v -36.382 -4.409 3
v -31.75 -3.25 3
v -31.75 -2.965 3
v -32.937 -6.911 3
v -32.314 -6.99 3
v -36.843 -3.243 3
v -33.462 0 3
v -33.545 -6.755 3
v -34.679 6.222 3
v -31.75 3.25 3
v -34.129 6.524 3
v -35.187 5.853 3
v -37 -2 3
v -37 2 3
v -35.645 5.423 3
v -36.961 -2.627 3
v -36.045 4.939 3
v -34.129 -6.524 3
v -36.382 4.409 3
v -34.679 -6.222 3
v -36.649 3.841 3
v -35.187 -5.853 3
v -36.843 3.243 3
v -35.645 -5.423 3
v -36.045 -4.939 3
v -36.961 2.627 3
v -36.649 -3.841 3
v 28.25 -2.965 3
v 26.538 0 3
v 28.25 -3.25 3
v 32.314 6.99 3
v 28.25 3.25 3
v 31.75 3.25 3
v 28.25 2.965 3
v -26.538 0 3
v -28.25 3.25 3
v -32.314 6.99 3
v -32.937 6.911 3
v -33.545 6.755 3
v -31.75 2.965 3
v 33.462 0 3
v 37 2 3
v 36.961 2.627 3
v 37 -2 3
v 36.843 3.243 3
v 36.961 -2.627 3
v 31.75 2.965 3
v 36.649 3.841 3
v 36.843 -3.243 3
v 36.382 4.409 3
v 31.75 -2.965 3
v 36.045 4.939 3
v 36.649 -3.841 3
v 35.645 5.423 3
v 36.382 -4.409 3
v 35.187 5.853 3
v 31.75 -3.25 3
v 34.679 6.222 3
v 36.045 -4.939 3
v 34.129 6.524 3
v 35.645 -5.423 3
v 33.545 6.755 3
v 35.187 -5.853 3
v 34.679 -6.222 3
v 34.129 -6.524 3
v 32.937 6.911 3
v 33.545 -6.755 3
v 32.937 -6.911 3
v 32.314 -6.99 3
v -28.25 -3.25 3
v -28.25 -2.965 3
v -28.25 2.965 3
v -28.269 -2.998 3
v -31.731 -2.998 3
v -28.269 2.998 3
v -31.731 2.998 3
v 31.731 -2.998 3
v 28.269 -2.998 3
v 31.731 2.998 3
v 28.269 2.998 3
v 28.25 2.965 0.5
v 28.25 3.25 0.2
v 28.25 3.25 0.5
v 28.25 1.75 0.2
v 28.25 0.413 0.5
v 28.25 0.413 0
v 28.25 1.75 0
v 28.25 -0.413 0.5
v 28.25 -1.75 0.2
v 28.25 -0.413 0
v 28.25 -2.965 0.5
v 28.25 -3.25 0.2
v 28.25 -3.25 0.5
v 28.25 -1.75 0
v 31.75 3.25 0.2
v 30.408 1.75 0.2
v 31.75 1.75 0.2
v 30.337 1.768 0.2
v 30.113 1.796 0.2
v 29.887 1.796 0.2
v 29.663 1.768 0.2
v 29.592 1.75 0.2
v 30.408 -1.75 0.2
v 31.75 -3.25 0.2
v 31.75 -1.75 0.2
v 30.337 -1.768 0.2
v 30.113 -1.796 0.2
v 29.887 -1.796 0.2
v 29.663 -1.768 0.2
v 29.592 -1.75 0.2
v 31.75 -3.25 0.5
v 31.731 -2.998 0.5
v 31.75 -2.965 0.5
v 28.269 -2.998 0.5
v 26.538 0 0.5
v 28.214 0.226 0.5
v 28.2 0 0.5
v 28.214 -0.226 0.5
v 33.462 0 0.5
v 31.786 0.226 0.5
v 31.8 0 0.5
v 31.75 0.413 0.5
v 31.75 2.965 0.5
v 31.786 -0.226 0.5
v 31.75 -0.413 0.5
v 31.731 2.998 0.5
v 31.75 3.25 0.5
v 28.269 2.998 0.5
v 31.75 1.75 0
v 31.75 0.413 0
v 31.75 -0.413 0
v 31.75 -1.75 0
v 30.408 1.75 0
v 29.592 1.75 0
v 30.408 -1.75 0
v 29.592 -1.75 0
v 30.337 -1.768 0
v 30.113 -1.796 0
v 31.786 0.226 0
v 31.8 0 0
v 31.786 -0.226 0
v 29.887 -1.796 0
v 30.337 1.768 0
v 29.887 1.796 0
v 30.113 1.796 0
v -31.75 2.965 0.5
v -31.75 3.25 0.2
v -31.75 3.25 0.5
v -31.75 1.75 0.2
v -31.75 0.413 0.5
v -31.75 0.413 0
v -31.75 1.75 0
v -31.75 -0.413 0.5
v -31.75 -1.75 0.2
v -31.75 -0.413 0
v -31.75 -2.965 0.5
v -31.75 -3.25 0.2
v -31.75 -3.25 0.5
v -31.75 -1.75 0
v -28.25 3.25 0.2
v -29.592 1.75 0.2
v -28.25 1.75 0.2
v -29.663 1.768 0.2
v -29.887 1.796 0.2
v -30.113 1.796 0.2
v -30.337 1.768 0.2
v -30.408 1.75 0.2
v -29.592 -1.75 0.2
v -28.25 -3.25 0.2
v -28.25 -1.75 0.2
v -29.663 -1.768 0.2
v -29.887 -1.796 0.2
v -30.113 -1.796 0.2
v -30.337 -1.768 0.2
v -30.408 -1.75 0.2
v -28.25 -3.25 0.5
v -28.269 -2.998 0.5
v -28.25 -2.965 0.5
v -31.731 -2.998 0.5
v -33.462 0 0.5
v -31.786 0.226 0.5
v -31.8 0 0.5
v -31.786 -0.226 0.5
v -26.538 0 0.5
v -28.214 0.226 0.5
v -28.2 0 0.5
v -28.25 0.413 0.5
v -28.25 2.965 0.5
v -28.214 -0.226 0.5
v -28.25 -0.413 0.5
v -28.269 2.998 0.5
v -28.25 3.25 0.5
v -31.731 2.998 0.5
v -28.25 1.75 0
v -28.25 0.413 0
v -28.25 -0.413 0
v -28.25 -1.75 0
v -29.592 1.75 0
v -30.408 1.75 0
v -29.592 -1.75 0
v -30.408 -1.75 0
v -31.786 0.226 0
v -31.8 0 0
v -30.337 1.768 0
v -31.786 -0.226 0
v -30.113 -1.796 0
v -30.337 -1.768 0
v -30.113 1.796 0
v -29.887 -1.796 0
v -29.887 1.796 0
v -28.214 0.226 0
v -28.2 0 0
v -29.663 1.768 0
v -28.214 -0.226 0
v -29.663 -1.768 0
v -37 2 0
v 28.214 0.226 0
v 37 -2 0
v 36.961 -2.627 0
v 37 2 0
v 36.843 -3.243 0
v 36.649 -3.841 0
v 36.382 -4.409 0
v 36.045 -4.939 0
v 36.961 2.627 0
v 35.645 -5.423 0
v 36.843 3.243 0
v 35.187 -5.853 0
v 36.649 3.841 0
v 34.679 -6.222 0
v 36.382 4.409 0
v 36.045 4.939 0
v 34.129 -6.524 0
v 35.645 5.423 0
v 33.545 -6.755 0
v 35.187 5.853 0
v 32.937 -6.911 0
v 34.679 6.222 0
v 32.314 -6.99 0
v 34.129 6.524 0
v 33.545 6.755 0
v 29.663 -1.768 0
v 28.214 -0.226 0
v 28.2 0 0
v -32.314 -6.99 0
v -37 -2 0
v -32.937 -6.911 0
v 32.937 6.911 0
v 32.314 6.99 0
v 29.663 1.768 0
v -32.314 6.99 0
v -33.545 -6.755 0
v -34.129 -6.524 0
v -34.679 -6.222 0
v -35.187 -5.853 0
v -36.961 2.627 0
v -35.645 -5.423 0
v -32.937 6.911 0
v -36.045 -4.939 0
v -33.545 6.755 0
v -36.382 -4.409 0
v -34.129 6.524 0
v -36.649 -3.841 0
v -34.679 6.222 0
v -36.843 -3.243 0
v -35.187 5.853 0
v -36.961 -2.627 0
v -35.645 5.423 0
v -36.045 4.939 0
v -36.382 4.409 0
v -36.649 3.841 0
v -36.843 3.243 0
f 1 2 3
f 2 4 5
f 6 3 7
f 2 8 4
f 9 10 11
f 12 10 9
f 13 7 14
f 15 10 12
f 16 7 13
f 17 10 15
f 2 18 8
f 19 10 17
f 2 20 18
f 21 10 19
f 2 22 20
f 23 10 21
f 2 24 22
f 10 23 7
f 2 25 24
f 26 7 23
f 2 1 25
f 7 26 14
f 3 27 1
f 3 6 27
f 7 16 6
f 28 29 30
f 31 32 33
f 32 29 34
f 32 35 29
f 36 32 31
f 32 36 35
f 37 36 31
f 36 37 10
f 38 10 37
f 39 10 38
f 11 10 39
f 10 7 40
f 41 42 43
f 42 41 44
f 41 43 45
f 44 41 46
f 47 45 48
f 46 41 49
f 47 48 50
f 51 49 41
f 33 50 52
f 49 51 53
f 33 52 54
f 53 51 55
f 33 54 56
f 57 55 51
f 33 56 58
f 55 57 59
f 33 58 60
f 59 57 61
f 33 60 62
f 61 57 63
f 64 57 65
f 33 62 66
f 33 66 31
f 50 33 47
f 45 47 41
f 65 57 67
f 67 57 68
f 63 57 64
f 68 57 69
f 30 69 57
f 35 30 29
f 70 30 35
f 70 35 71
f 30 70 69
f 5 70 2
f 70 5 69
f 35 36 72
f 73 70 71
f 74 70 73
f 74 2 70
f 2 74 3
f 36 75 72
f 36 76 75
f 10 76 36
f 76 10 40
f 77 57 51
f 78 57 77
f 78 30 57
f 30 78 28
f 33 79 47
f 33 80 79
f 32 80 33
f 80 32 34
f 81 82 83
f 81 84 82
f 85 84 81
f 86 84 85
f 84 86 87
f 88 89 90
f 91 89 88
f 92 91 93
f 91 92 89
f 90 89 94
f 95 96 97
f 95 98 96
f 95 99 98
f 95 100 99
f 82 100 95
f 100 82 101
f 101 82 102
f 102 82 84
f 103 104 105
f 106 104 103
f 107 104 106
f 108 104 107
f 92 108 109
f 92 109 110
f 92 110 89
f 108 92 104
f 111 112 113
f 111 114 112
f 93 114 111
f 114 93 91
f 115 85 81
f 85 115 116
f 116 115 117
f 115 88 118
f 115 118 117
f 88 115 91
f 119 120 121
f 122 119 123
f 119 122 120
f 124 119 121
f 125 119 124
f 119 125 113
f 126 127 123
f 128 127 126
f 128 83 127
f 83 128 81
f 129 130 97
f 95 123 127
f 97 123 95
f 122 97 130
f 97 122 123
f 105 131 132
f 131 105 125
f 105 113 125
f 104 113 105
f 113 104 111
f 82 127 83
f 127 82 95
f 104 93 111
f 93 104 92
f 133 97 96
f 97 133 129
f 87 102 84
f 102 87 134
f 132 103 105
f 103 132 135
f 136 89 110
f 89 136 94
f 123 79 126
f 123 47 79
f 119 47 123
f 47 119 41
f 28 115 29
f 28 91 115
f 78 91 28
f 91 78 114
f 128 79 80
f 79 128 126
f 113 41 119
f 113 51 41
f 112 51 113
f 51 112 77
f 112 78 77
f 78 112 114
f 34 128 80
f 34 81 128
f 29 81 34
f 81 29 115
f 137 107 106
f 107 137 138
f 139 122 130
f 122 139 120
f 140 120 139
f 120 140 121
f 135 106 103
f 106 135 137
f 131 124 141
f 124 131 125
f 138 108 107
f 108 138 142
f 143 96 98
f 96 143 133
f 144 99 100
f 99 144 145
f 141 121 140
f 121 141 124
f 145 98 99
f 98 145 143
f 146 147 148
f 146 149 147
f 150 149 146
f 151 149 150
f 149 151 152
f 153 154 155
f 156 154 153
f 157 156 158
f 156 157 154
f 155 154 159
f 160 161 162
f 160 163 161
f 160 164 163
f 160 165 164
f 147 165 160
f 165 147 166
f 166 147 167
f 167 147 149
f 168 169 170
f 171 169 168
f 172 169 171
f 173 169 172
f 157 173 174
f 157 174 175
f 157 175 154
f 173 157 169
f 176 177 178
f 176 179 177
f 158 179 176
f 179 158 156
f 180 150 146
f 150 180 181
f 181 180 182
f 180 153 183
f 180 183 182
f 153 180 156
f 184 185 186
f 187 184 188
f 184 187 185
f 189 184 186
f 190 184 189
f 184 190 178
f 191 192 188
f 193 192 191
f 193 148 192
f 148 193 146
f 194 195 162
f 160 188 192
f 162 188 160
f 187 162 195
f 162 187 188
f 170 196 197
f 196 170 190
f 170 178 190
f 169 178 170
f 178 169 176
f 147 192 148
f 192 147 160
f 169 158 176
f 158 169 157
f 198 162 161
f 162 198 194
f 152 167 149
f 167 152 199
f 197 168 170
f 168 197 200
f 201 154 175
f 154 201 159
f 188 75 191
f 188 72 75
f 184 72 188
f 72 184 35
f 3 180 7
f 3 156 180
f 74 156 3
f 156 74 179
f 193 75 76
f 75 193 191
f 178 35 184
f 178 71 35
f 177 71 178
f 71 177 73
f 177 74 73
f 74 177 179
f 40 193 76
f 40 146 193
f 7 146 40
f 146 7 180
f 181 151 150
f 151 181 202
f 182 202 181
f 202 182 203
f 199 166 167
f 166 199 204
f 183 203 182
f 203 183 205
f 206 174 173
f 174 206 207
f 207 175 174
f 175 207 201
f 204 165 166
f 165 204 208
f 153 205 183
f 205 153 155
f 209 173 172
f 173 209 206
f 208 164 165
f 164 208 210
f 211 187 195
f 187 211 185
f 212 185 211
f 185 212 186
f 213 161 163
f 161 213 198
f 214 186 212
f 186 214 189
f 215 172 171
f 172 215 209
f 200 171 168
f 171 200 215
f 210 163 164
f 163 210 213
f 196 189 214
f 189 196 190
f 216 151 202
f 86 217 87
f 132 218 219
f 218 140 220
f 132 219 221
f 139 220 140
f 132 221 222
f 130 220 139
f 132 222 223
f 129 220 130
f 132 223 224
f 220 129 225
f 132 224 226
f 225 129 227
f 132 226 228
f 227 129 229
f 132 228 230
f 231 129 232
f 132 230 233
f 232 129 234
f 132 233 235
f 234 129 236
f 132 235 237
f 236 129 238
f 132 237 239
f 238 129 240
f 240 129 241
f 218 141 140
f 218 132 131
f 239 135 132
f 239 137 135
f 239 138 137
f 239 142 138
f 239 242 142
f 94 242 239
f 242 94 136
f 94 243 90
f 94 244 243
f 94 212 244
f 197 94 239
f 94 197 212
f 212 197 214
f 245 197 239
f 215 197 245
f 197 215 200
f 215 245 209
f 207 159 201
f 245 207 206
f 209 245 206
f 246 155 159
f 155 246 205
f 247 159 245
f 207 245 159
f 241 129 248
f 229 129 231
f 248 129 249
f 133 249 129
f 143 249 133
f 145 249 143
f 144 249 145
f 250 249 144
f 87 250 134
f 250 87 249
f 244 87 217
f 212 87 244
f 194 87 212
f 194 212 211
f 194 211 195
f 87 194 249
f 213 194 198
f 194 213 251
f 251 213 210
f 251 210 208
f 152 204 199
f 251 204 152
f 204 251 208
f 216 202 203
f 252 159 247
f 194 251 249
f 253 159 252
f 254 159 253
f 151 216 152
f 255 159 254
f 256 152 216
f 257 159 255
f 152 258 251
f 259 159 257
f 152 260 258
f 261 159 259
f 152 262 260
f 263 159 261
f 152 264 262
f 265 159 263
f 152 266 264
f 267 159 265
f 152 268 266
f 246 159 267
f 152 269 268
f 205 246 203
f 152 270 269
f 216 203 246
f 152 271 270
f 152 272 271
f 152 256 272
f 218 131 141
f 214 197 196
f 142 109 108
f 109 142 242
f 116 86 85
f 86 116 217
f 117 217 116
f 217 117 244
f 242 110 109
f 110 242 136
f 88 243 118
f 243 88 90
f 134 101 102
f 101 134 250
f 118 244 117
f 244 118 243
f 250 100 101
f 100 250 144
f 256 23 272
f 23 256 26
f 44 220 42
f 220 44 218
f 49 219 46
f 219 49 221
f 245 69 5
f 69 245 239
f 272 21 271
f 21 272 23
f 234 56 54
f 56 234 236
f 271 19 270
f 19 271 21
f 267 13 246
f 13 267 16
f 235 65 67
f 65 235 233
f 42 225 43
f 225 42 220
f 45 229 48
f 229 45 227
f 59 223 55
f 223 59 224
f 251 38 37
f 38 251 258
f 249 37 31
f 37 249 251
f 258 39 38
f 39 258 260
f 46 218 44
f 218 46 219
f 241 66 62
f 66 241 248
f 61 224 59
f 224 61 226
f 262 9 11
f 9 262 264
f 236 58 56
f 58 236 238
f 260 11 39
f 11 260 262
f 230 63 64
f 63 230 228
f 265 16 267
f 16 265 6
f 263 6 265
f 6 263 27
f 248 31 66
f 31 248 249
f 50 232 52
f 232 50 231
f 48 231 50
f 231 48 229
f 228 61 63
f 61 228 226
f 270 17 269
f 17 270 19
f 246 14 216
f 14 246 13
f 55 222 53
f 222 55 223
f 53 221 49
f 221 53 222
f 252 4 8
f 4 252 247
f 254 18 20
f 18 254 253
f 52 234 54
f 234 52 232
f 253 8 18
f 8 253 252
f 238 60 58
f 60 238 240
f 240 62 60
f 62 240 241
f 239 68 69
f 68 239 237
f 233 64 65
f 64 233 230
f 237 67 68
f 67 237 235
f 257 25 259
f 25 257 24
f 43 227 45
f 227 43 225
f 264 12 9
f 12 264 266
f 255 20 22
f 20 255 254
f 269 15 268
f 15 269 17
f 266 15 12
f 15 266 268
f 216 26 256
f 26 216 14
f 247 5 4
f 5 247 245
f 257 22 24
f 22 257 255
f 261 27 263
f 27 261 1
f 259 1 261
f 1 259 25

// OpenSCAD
$fn = 50;


difference() {
	union() {
		hull() {
			translate(v = [-32.0000000000, 2.0000000000, 0]) {
				cylinder(h = 3, r = 5);
			}
			translate(v = [32.0000000000, 2.0000000000, 0]) {
				cylinder(h = 3, r = 5);
			}
			translate(v = [-32.0000000000, -2.0000000000, 0]) {
				cylinder(h = 3, r = 5);
			}
			translate(v = [32.0000000000, -2.0000000000, 0]) {
				cylinder(h = 3, r = 5);
			}
		}
	}
	union() {
		translate(v = [30.0000000000, 0, -20]) {
			rotate(a = [0, 180, 0]) {
				difference() {
					union() {
						translate(v = [0, 0, -23.0000000000]) {
							rotate(a = [0, 0, 0]) {
								difference() {
									union() {
										#translate(v = [-1.7500000000, -3.2500000000, -0.3000000000]) {
											cube(size = [3.5000000000, 6.5000000000, 0.3000000000]);
										}
										#translate(v = [-1.7500000000, -1.7500000000, -0.6000000000]) {
											cube(size = [3.5000000000, 3.5000000000, 0.3000000000]);
										}
										#translate(v = [-1.7500000000, -3.2500000000, 2.5000000000]) {
											cube(size = [3.5000000000, 6.5000000000, 0.3000000000]);
										}
										#translate(v = [-1.7500000000, -1.7500000000, 2.8000000000]) {
											cube(size = [3.5000000000, 3.5000000000, 0.3000000000]);
										}
										#linear_extrude(height = 2.5000000000) {
											polygon(points = [[3.4620000000, 0.0000000000], [1.7310000000, 2.9981799479], [-1.7310000000, 2.9981799479], [-3.4620000000, 0.0000000000], [-1.7310000000, -2.9981799479], [1.7310000000, -2.9981799479]]);
										}
										#translate(v = [-1.7500000000, -3.2500000000, -0.3000000000]) {
											cube(size = [3.5000000000, 6.5000000000, 0.3000000000]);
										}
										#translate(v = [-1.7500000000, -1.7500000000, -0.6000000000]) {
											cube(size = [3.5000000000, 3.5000000000, 0.3000000000]);
										}
										#translate(v = [-1.7500000000, -3.2500000000, 2.5000000000]) {
											cube(size = [3.5000000000, 6.5000000000, 0.3000000000]);
										}
										#translate(v = [-1.7500000000, -1.7500000000, 2.8000000000]) {
											cube(size = [3.5000000000, 3.5000000000, 0.3000000000]);
										}
										#translate(v = [-1.7500000000, -3.2500000000, -0.3000000000]) {
											cube(size = [3.5000000000, 6.5000000000, 0.3000000000]);
										}
										#translate(v = [-1.7500000000, -1.7500000000, -0.6000000000]) {
											cube(size = [3.5000000000, 3.5000000000, 0.3000000000]);
										}
										#translate(v = [-1.7500000000, -3.2500000000, 2.5000000000]) {
											cube(size = [3.5000000000, 6.5000000000, 0.3000000000]);
										}
										#translate(v = [-1.7500000000, -1.7500000000, 2.8000000000]) {
											cube(size = [3.5000000000, 3.5000000000, 0.3000000000]);
										}
									}
									union();
								}
							}
						}
						translate(v = [0, 0, -23.0000000000]) {
							rotate(a = [0, 0, 0]) {
								difference() {
									union() {
										#translate(v = [-1.7500000000, -3.2500000000, -0.3000000000]) {
											cube(size = [3.5000000000, 6.5000000000, 0.3000000000]);
										}
										#translate(v = [-1.7500000000, -1.7500000000, -0.6000000000]) {
											cube(size = [3.5000000000, 3.5000000000, 0.3000000000]);
										}
										#translate(v = [-1.7500000000, -3.2500000000, 2.5000000000]) {
											cube(size = [3.5000000000, 6.5000000000, 0.3000000000]);
										}
										#translate(v = [-1.7500000000, -1.7500000000, 2.8000000000]) {
											cube(size = [3.5000000000, 3.5000000000, 0.3000000000]);
										}
										#linear_extrude(height = 2.5000000000) {
											polygon(points = [[3.4620000000, 0.0000000000], [1.7310000000, 2.9981799479], [-1.7310000000, 2.9981799479], [-3.4620000000, 0.0000000000], [-1.7310000000, -2.9981799479], [1.7310000000, -2.9981799479]]);
										}
										#translate(v = [-1.7500000000, -3.2500000000, -0.3000000000]) {
											cube(size = [3.5000000000, 6.5000000000, 0.3000000000]);
										}
										#translate(v = [-1.7500000000, -1.7500000000, -0.6000000000]) {
											cube(size = [3.5000000000, 3.5000000000, 0.3000000000]);
										}
										#translate(v = [-1.7500000000, -3.2500000000, 2.5000000000]) {
											cube(size = [3.5000000000, 6.5000000000, 0.3000000000]);
										}
										#translate(v = [-1.7500000000, -1.7500000000, 2.8000000000]) {
											cube(size = [3.5000000000, 3.5000000000, 0.3000000000]);
										}
										#translate(v = [-1.7500000000, -3.2500000000, -0.3000000000]) {
											cube(size = [3.5000000000, 6.5000000000, 0.3000000000]);
										}
										#translate(v = [-1.7500000000, -1.7500000000, -0.6000000000]) {
											cube(size = [3.5000000000, 3.5000000000, 0.3000000000]);
										}
										#translate(v = [-1.7500000000, -3.2500000000, 2.5000000000]) {
											cube(size = [3.5000000000, 6.5000000000, 0.3000000000]);
										}
										#translate(v = [-1.7500000000, -1.7500000000, 2.8000000000]) {
											cube(size = [3.5000000000, 3.5000000000, 0.3000000000]);
										}
									}
									union();
								}
							}
						}
						translate(v = [0, 0, -23.0000000000]) {
							rotate(a = [0, 0, 0]) {
								difference() {
									union() {
										#translate(v = [-1.7500000000, -3.2500000000, -0.3000000000]) {
											cube(size = [3.5000000000, 6.5000000000, 0.3000000000]);
										}
										#translate(v = [-1.7500000000, -1.7500000000, -0.6000000000]) {
											cube(size = [3.5000000000, 3.5000000000, 0.3000000000]);
										}
										#translate(v = [-1.7500000000, -3.2500000000, 2.5000000000]) {
											cube(size = [3.5000000000, 6.5000000000, 0.3000000000]);
										}
										#translate(v = [-1.7500000000, -1.7500000000, 2.8000000000]) {
											cube(size = [3.5000000000, 3.5000000000, 0.3000000000]);
										}
										#linear_extrude(height = 2.5000000000) {
											polygon(points = [[3.4620000000, 0.0000000000], [1.7310000000, 2.9981799479], [-1.7310000000, 2.9981799479], [-3.4620000000, 0.0000000000], [-1.7310000000, -2.9981799479], [1.7310000000, -2.9981799479]]);
										}
										#translate(v = [-1.7500000000, -3.2500000000, -0.3000000000]) {
											cube(size = [3.5000000000, 6.5000000000, 0.3000000000]);
										}
										#translate(v = [-1.7500000000, -1.7500000000, -0.6000000000]) {
											cube(size = [3.5000000000, 3.5000000000, 0.3000000000]);
										}
										#translate(v = [-1.7500000000, -3.2500000000, 2.5000000000]) {
											cube(size = [3.5000000000, 6.5000000000, 0.3000000000]);
										}
										#translate(v = [-1.7500000000, -1.7500000000, 2.8000000000]) {
											cube(size = [3.5000000000, 3.5000000000, 0.3000000000]);
										}
										#translate(v = [-1.7500000000, -3.2500000000, -0.3000000000]) {
											cube(size = [3.5000000000, 6.5000000000, 0.3000000000]);
										}
										#translate(v = [-1.7500000000, -1.7500000000, -0.6000000000]) {
											cube(size = [3.5000000000, 3.5000000000, 0.3000000000]);
										}
										#translate(v = [-1.7500000000, -3.2500000000, 2.5000000000]) {
											cube(size = [3.5000000000, 6.5000000000, 0.3000000000]);
										}
										#translate(v = [-1.7500000000, -1.7500000000, 2.8000000000]) {
											cube(size = [3.5000000000, 3.5000000000, 0.3000000000]);
										}
									}
									union();
								}
							}
						}
						#translate(v = [0, 0, -23.0000000000]) {
							cylinder(h = 23, r = 1.5000000000);
						}
						#translate(v = [0, 0, -1.9000000000]) {
							cylinder(h = 1.9000000000, r1 = 1.8000000000, r2 = 3.6000000000);
						}
						#translate(v = [0, 0, -23.0000000000]) {
							cylinder(h = 23, r = 1.8000000000);
						}
						#translate(v = [0, 0, -23.0000000000]) {
							cylinder(h = 23, r = 1.5000000000);
						}
					}
					union();
				}
			}
		}
		translate(v = [-30.0000000000, 0, -20]) {
			rotate(a = [0, 180, 0]) {
				difference() {
					union() {
						translate(v = [0, 0, -23.0000000000]) {
							rotate(a = [0, 0, 0]) {
								difference() {
									union() {
										#translate(v = [-1.7500000000, -3.2500000000, -0.3000000000]) {
											cube(size = [3.5000000000, 6.5000000000, 0.3000000000]);
										}
										#translate(v = [-1.7500000000, -1.7500000000, -0.6000000000]) {
											cube(size = [3.5000000000, 3.5000000000, 0.3000000000]);
										}
										#translate(v = [-1.7500000000, -3.2500000000, 2.5000000000]) {
											cube(size = [3.5000000000, 6.5000000000, 0.3000000000]);
										}
										#translate(v = [-1.7500000000, -1.7500000000, 2.8000000000]) {
											cube(size = [3.5000000000, 3.5000000000, 0.3000000000]);
										}
										#linear_extrude(height = 2.5000000000) {
											polygon(points = [[3.4620000000, 0.0000000000], [1.7310000000, 2.9981799479], [-1.7310000000, 2.9981799479], [-3.4620000000, 0.0000000000], [-1.7310000000, -2.9981799479], [1.7310000000, -2.9981799479]]);
										}
										#translate(v = [-1.7500000000, -3.2500000000, -0.3000000000]) {
											cube(size = [3.5000000000, 6.5000000000, 0.3000000000]);
										}
										#translate(v = [-1.7500000000, -1.7500000000, -0.6000000000]) {
											cube(size = [3.5000000000, 3.5000000000, 0.3000000000]);
										}
										#translate(v = [-1.7500000000, -3.2500000000, 2.5000000000]) {
											cube(size = [3.5000000000, 6.5000000000, 0.3000000000]);
										}
										#translate(v = [-1.7500000000, -1.7500000000, 2.8000000000]) {
											cube(size = [3.5000000000, 3.5000000000, 0.3000000000]);
										}
										#translate(v = [-1.7500000000, -3.2500000000, -0.3000000000]) {
											cube(size = [3.5000000000, 6.5000000000, 0.3000000000]);
										}
										#translate(v = [-1.7500000000, -1.7500000000, -0.6000000000]) {
											cube(size = [3.5000000000, 3.5000000000, 0.3000000000]);
										}
										#translate(v = [-1.7500000000, -3.2500000000, 2.5000000000]) {
											cube(size = [3.5000000000, 6.5000000000, 0.3000000000]);
										}
										#translate(v = [-1.7500000000, -1.7500000000, 2.8000000000]) {
											cube(size = [3.5000000000, 3.5000000000, 0.3000000000]);
										}
									}
									union();
								}
							}
						}
						translate(v = [0, 0, -23.0000000000]) {
							rotate(a = [0, 0, 0]) {
								difference() {
									union() {
										#translate(v = [-1.7500000000, -3.2500000000, -0.3000000000]) {
											cube(size = [3.5000000000, 6.5000000000, 0.3000000000]);
										}
										#translate(v = [-1.7500000000, -1.7500000000, -0.6000000000]) {
											cube(size = [3.5000000000, 3.5000000000, 0.3000000000]);
										}
										#translate(v = [-1.7500000000, -3.2500000000, 2.5000000000]) {
											cube(size = [3.5000000000, 6.5000000000, 0.3000000000]);
										}
										#translate(v = [-1.7500000000, -1.7500000000, 2.8000000000]) {
											cube(size = [3.5000000000, 3.5000000000, 0.3000000000]);
										}
										#linear_extrude(height = 2.5000000000) {
											polygon(points = [[3.4620000000, 0.0000000000], [1.7310000000, 2.9981799479], [-1.7310000000, 2.9981799479], [-3.4620000000, 0.0000000000], [-1.7310000000, -2.9981799479], [1.7310000000, -2.9981799479]]);
										}
										#translate(v = [-1.7500000000, -3.2500000000, -0.3000000000]) {
											cube(size = [3.5000000000, 6.5000000000, 0.3000000000]);
										}
										#translate(v = [-1.7500000000, -1.7500000000, -0.6000000000]) {
											cube(size = [3.5000000000, 3.5000000000, 0.3000000000]);
										}
										#translate(v = [-1.7500000000, -3.2500000000, 2.5000000000]) {
											cube(size = [3.5000000000, 6.5000000000, 0.3000000000]);
										}
										#translate(v = [-1.7500000000, -1.7500000000, 2.8000000000]) {
											cube(size = [3.5000000000, 3.5000000000, 0.3000000000]);
										}
										#translate(v = [-1.7500000000, -3.2500000000, -0.3000000000]) {
											cube(size = [3.5000000000, 6.5000000000, 0.3000000000]);
										}
										#translate(v = [-1.7500000000, -1.7500000000, -0.6000000000]) {
											cube(size = [3.5000000000, 3.5000000000, 0.3000000000]);
										}
										#translate(v = [-1.7500000000, -3.2500000000, 2.5000000000]) {
											cube(size = [3.5000000000, 6.5000000000, 0.3000000000]);
										}
										#translate(v = [-1.7500000000, -1.7500000000, 2.8000000000]) {
											cube(size = [3.5000000000, 3.5000000000, 0.3000000000]);
										}
									}
									union();
								}
							}
						}
						translate(v = [0, 0, -23.0000000000]) {
							rotate(a = [0, 0, 0]) {
								difference() {
									union() {
										#translate(v = [-1.7500000000, -3.2500000000, -0.3000000000]) {
											cube(size = [3.5000000000, 6.5000000000, 0.3000000000]);
										}
										#translate(v = [-1.7500000000, -1.7500000000, -0.6000000000]) {
											cube(size = [3.5000000000, 3.5000000000, 0.3000000000]);
										}
										#translate(v = [-1.7500000000, -3.2500000000, 2.5000000000]) {
											cube(size = [3.5000000000, 6.5000000000, 0.3000000000]);
										}
										#translate(v = [-1.7500000000, -1.7500000000, 2.8000000000]) {
											cube(size = [3.5000000000, 3.5000000000, 0.3000000000]);
										}
										#linear_extrude(height = 2.5000000000) {
											polygon(points = [[3.4620000000, 0.0000000000], [1.7310000000, 2.9981799479], [-1.7310000000, 2.9981799479], [-3.4620000000, 0.0000000000], [-1.7310000000, -2.9981799479], [1.7310000000, -2.9981799479]]);
										}
										#translate(v = [-1.7500000000, -3.2500000000, -0.3000000000]) {
											cube(size = [3.5000000000, 6.5000000000, 0.3000000000]);
										}
										#translate(v = [-1.7500000000, -1.7500000000, -0.6000000000]) {
											cube(size = [3.5000000000, 3.5000000000, 0.3000000000]);
										}
										#translate(v = [-1.7500000000, -3.2500000000, 2.5000000000]) {
											cube(size = [3.5000000000, 6.5000000000, 0.3000000000]);
										}
										#translate(v = [-1.7500000000, -1.7500000000, 2.8000000000]) {
											cube(size = [3.5000000000, 3.5000000000, 0.3000000000]);
										}
										#translate(v = [-1.7500000000, -3.2500000000, -0.3000000000]) {
											cube(size = [3.5000000000, 6.5000000000, 0.3000000000]);
										}
										#translate(v = [-1.7500000000, -1.7500000000, -0.6000000000]) {
											cube(size = [3.5000000000, 3.5000000000, 0.3000000000]);
										}
										#translate(v = [-1.7500000000, -3.2500000000, 2.5000000000]) {
											cube(size = [3.5000000000, 6.5000000000, 0.3000000000]);
										}
										#translate(v = [-1.7500000000, -1.7500000000, 2.8000000000]) {
											cube(size = [3.5000000000, 3.5000000000, 0.3000000000]);
										}
									}
									union();
								}
							}
						}
						#translate(v = [0, 0, -23.0000000000]) {
							cylinder(h = 23, r = 1.5000000000);
						}
						#translate(v = [0, 0, -1.9000000000]) {
							cylinder(h = 1.9000000000, r1 = 1.8000000000, r2 = 3.6000000000);
						}
						#translate(v = [0, 0, -23.0000000000]) {
							cylinder(h = 23, r = 1.8000000000);
						}
						#translate(v = [0, 0, -23.0000000000]) {
							cylinder(h = 23, r = 1.5000000000);
						}
					}
					union();
				}
			}
		}
		translate(v = [-30.0000000000, 0.0000000000, 0]) {
			cylinder(h = 3, r = 1.8000000000);
		}
		translate(v = [30.0000000000, 0.0000000000, 0]) {
			cylinder(h = 3, r = 1.8000000000);
		}
		translate(v = [-30.0000000000, 0.0000000000, 0]) {
			cylinder(h = 3, r = 1.8000000000);
		}
		translate(v = [30.0000000000, 0.0000000000, 0]) {
			cylinder(h = 3, r = 1.8000000000);
		}
		translate(v = [-30.0000000000, 0.0000000000, 0]) {
			cylinder(h = 3, r = 1.8000000000);
		}
		translate(v = [30.0000000000, 0.0000000000, 0]) {
			cylinder(h = 3, r = 1.8000000000);
		}
		translate(v = [-30.0000000000, 0.0000000000, 0]) {
			cylinder(h = 3, r = 1.8000000000);
		}
		translate(v = [30.0000000000, 0.0000000000, 0]) {
			cylinder(h = 3, r = 1.8000000000);
		}
	}
}
